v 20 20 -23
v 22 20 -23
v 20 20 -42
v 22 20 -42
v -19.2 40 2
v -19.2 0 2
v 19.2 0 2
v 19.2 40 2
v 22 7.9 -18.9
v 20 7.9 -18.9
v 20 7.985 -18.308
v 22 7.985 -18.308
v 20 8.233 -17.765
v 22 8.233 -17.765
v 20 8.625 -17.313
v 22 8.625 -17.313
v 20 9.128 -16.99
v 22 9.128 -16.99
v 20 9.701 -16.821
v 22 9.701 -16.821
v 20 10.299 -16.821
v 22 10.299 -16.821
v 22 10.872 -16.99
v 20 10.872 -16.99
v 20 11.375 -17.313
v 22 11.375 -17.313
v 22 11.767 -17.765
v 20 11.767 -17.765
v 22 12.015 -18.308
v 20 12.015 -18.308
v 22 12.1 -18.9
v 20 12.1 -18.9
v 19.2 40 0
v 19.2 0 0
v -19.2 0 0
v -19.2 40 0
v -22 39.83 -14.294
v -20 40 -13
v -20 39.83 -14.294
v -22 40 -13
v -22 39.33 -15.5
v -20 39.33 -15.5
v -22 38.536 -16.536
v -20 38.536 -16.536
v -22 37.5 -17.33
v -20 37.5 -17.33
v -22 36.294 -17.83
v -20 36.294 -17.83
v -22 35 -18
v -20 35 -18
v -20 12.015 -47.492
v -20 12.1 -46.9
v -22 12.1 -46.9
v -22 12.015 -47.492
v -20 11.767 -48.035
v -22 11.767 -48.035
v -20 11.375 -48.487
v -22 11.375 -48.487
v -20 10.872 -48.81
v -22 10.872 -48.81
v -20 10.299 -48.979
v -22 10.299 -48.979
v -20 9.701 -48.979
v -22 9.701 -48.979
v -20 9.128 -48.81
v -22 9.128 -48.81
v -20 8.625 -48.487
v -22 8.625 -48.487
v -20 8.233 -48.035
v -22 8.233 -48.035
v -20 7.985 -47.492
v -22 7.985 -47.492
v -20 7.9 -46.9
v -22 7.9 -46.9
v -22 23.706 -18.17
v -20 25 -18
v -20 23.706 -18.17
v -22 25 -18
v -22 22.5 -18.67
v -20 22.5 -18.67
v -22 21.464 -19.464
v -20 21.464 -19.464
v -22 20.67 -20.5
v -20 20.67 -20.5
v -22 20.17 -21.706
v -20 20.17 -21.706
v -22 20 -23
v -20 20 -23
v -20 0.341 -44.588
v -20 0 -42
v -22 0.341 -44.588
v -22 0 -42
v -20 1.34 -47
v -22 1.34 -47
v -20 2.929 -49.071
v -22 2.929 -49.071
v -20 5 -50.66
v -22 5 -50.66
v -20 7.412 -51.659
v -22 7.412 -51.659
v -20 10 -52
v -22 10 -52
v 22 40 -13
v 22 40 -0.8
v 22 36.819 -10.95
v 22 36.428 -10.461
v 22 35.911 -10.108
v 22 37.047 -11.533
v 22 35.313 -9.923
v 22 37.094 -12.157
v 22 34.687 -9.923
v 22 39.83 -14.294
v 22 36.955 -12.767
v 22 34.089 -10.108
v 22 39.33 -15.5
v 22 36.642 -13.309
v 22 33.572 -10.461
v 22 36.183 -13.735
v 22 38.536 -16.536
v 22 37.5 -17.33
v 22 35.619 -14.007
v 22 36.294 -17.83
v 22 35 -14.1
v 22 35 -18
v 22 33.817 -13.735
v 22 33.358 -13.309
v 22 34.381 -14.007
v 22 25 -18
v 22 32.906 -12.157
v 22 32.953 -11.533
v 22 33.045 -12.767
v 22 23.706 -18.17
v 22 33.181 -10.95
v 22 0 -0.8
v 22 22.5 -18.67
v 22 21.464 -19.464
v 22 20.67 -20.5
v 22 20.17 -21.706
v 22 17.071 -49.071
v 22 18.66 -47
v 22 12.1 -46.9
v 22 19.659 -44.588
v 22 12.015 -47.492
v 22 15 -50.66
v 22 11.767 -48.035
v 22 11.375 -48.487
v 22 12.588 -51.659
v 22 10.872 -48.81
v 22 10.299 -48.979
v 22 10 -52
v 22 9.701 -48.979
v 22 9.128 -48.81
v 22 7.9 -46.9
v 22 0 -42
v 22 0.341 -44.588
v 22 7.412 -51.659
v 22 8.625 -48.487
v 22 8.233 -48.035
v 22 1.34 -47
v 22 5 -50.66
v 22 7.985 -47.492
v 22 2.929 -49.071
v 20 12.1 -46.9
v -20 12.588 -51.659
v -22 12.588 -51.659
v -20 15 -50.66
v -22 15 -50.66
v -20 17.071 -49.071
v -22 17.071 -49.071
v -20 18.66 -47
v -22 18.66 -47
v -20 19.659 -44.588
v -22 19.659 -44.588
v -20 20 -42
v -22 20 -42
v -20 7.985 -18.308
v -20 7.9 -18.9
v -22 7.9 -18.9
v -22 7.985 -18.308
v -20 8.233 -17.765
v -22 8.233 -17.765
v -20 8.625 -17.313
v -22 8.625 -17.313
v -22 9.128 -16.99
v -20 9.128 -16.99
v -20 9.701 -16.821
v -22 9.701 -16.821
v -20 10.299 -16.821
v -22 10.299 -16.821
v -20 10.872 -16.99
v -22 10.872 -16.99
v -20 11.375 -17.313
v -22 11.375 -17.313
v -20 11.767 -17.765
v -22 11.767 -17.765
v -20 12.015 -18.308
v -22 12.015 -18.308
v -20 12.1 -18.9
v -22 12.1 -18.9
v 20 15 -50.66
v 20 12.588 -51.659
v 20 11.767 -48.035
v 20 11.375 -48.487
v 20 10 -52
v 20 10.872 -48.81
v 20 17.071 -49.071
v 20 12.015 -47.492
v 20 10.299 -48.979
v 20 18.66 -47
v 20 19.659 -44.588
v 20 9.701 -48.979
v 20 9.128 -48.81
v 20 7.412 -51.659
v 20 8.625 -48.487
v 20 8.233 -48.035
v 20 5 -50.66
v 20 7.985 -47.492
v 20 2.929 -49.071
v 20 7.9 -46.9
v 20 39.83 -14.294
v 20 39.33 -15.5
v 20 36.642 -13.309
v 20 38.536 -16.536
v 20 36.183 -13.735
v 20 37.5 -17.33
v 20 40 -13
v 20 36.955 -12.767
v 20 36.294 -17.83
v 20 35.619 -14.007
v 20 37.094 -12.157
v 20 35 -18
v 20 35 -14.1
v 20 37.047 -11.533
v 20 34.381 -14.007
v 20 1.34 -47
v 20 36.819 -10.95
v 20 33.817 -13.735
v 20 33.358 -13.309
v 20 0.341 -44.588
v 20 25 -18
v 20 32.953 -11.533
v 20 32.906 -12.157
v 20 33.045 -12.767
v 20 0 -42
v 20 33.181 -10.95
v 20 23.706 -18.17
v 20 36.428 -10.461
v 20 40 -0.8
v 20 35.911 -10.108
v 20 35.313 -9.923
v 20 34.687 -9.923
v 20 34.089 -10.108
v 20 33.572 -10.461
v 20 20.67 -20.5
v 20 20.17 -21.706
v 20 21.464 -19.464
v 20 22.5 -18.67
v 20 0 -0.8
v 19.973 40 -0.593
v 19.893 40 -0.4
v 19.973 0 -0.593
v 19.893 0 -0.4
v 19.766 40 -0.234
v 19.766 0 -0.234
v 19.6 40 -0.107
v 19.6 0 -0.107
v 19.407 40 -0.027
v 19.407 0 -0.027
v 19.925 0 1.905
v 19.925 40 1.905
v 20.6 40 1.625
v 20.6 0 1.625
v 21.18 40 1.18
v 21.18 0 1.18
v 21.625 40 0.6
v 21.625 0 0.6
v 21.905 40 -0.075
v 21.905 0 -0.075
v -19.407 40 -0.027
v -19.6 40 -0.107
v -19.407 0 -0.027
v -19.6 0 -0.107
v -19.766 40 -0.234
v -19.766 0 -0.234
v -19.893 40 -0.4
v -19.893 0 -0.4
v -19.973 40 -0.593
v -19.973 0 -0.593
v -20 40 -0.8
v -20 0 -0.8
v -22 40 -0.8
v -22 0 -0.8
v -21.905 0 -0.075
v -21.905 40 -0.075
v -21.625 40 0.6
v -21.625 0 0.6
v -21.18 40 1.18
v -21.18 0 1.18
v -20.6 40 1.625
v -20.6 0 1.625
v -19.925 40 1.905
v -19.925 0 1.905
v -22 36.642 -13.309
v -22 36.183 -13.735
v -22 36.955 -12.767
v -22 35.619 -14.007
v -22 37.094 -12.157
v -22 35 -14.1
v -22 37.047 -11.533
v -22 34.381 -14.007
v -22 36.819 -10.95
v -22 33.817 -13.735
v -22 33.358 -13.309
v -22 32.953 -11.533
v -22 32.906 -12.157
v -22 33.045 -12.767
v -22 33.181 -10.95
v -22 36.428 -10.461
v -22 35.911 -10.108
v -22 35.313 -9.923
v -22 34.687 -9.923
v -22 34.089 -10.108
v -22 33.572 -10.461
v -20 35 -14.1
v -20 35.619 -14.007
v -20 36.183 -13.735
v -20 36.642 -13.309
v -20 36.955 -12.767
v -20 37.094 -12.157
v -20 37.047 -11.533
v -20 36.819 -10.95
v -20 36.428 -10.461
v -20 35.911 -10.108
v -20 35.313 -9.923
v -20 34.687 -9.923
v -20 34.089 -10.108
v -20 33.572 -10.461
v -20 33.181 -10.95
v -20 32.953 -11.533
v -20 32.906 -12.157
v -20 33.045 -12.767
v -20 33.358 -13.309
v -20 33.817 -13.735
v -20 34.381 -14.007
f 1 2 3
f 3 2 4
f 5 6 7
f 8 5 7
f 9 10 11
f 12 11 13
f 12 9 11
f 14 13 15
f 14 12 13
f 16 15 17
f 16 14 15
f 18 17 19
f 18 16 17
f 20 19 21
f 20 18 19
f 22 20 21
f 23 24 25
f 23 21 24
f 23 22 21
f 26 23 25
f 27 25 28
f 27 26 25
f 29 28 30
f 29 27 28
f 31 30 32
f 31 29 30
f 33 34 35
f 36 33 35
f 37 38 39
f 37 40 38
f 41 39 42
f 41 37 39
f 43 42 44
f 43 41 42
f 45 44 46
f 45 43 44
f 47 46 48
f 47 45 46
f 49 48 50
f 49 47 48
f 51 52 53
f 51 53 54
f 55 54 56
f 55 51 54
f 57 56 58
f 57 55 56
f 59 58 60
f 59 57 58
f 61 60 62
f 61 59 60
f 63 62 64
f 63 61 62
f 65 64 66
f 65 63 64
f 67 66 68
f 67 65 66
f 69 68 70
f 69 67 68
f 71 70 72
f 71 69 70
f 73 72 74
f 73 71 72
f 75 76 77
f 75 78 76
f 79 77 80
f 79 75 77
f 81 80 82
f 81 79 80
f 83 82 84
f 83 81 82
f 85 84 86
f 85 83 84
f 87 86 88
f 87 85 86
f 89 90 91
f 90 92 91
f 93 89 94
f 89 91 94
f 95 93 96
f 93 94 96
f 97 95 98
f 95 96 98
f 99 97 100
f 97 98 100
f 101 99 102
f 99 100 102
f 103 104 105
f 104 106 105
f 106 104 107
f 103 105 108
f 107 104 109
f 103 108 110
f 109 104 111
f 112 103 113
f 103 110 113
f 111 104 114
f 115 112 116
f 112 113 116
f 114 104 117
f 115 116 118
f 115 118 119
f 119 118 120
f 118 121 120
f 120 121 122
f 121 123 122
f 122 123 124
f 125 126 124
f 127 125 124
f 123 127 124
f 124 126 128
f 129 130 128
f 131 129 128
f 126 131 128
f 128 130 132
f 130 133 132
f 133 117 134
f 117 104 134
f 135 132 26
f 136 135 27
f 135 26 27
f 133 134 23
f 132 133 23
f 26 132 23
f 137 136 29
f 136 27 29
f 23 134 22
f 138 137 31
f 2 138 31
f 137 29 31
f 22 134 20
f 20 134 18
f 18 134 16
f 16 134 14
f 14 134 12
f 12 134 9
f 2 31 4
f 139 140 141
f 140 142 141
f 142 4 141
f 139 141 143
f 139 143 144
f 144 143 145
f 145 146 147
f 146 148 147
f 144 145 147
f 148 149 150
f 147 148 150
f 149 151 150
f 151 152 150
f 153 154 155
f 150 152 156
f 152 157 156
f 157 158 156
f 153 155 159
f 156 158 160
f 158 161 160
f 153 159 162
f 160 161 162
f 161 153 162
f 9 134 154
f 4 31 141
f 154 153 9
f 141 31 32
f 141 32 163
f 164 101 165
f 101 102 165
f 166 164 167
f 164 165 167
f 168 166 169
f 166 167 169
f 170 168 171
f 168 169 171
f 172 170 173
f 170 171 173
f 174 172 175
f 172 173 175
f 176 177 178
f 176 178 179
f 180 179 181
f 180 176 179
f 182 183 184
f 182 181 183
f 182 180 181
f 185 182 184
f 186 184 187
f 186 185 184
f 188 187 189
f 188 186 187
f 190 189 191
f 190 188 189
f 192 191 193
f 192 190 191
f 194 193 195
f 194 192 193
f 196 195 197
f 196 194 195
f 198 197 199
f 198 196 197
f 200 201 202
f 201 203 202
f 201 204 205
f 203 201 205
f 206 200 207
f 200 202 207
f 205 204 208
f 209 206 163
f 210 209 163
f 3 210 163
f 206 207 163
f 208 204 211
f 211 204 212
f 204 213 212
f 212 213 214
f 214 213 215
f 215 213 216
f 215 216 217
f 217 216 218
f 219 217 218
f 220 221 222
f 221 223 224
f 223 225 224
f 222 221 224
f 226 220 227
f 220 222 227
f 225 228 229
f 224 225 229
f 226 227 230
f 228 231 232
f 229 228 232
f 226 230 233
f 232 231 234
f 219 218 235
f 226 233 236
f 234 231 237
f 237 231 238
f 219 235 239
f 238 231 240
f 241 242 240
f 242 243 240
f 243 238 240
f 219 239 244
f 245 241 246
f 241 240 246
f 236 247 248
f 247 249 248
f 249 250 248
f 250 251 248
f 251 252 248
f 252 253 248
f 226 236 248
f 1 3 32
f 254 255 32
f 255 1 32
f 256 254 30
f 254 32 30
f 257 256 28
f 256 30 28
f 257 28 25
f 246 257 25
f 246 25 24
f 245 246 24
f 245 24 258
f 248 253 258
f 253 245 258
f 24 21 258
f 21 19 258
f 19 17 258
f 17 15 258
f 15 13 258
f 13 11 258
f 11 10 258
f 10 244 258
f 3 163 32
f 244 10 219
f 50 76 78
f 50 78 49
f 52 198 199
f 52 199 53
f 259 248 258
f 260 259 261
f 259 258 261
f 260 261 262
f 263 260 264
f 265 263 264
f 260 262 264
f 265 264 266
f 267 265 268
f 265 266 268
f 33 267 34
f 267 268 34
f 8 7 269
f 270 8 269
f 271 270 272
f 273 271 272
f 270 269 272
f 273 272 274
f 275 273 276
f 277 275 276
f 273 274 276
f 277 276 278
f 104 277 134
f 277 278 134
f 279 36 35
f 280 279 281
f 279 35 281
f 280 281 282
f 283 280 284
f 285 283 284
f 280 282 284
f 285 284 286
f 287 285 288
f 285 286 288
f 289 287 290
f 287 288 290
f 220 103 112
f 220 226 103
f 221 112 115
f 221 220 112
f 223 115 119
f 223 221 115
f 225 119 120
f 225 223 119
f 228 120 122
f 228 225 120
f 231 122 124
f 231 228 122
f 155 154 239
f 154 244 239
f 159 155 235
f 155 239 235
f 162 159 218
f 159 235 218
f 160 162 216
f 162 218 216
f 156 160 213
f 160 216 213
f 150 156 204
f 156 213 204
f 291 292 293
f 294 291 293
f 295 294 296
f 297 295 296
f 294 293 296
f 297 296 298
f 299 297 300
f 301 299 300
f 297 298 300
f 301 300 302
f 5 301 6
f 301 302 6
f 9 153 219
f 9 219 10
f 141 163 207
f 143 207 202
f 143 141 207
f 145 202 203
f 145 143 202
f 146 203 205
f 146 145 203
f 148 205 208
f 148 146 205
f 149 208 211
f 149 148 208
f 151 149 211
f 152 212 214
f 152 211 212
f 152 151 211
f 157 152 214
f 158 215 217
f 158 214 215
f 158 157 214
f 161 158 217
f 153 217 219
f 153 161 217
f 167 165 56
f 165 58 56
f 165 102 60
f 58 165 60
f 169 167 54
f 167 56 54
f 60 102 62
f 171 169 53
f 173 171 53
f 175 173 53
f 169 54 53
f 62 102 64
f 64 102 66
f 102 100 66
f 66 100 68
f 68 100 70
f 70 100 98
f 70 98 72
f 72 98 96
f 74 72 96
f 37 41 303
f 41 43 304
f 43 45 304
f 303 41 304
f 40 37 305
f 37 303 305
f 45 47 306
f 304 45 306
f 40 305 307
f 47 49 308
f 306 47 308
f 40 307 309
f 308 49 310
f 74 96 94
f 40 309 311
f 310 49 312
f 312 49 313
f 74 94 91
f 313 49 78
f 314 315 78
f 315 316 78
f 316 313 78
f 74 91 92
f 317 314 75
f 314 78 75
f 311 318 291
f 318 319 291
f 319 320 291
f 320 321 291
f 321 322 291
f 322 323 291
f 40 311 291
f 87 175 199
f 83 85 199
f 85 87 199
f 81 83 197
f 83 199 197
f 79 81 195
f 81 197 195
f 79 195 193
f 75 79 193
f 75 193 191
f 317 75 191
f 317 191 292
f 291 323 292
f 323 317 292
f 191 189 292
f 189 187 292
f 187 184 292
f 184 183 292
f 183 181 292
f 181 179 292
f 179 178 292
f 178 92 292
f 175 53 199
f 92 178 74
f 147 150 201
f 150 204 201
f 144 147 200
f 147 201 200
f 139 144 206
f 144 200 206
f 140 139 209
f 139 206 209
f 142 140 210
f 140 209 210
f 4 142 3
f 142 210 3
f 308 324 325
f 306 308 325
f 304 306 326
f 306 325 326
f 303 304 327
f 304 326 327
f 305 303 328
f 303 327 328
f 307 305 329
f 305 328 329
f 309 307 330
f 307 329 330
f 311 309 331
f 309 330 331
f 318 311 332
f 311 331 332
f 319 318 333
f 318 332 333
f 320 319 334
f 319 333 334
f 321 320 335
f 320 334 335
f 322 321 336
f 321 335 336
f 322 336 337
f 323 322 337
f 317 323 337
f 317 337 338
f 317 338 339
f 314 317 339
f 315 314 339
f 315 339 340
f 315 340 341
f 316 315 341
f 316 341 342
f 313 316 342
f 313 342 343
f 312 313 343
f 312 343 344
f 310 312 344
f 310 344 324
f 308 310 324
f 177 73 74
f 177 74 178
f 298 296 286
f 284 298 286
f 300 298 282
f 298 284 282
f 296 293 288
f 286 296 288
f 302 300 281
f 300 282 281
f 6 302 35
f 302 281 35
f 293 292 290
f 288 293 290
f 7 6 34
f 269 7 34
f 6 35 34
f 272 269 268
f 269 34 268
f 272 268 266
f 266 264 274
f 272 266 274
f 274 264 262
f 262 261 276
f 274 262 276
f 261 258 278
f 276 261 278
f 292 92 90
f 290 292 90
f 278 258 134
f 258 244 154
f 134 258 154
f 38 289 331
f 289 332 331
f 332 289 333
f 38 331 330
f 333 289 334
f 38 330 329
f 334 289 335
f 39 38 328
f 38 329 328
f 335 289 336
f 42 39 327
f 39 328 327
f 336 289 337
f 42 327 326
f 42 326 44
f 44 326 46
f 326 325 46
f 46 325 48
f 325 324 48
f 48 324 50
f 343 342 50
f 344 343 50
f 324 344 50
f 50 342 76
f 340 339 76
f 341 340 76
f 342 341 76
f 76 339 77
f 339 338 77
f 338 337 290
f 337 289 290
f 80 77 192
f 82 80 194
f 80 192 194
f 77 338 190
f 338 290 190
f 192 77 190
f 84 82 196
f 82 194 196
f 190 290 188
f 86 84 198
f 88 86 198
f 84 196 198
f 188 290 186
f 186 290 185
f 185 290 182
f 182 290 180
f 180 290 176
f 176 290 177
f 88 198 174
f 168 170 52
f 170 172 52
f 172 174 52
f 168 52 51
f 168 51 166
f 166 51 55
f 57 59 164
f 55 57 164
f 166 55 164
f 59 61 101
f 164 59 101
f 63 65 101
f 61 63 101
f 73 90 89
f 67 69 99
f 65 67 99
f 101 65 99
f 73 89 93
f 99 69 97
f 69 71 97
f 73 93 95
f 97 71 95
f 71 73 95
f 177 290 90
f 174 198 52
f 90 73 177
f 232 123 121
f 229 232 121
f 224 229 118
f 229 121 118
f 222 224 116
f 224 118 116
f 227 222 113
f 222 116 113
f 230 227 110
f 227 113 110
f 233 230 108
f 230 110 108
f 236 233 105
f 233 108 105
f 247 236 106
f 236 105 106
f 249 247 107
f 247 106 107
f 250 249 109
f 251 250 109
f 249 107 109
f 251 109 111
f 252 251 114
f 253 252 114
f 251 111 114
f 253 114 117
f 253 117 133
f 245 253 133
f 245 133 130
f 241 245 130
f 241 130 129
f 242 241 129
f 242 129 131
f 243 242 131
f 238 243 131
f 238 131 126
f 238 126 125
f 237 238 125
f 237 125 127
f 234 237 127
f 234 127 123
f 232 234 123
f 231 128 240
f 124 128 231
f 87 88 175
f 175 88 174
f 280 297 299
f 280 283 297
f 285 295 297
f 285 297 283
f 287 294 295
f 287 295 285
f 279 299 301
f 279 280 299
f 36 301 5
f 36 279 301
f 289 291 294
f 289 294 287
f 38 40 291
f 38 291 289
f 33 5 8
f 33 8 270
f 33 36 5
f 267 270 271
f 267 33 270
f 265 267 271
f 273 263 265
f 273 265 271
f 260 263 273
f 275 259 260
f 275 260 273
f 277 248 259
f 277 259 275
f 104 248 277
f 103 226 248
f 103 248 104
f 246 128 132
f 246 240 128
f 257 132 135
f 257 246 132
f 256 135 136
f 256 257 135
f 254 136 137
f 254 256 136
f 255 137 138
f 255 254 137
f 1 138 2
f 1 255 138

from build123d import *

# Parameters (mm, degrees)
BASE_FLANGE1_DEPTH = 40
SKETCH6_W          = 34
SKETCH6_H          = 20
CUT_EXTRUDE1_DEPTH = 79.993670633
FILLET1_R          = 10
FILLET2_R          = 5
SKETCH7_R          = 2.1
CUT_EXTRUDE2_DEPTH = 79.993670633


# Read off the part's stored shape, not the designer's step: Base-Flange1
with BuildPart() as part:
    # Base-Flange1 outline → Base-Flange1 (new body)
    with BuildSketch(Plane(origin=(0, 0, 0), x_dir=(1, 0, 0), z_dir=(0, 1, 0))):
        with BuildLine():
            Line((-20, 0.8), (-20, 52))
            Line((-20, 52), (-22, 52))
            Line((-22, 52), (-22, 0.8))
            ThreePointArc((-22, 0.8), (-21.179898987, -1.179898987), (-19.2, -2))
            Line((-19.2, -2), (19.2, -2))
            ThreePointArc((19.2, -2), (21.179898987, -1.179898987), (22, 0.8))
            Line((22, 0.8), (22, 52))
            Line((22, 52), (20, 52))
            Line((20, 52), (20, 0.8))
            ThreePointArc((20, 0.8), (19.765685425, 0.234314575), (19.2, 0))
            Line((19.2, 0), (-19.2, 0))
            ThreePointArc((-19.2, 0), (-19.765685425, 0.234314575), (-20, 0.8))
        make_face()
    extrude(amount=BASE_FLANGE1_DEPTH)

    # Sketch6 → Cut-Extrude1 (cut, through all)
    with BuildSketch(Plane(origin=(22, 0, 0), x_dir=(0, 0, -1), z_dir=(1, 0, 0))):
        with Locations((35, 30)):
            Rectangle(SKETCH6_W, SKETCH6_H)
    extrude(amount=-CUT_EXTRUDE1_DEPTH, mode=Mode.SUBTRACT)

    # Fillet1
    fillet1_edges = [part.edges().sort_by_distance(p)[0] for p in [
        (-21, 0, -52),
        (-21, 20, -52),
        (21, 0, -52),
        (21, 20, -52),
    ]]
    fillet(fillet1_edges, radius=FILLET1_R - 0.0001)  # a hair under: the kernel refuses the full size

    # Fillet2
    fillet2_edges = [part.edges().sort_by_distance(p)[0] for p in [
        (-21, 40, -18),
        (21, 40, -18),
        (-21, 20, -18),
        (21, 20, -18),
    ]]
    fillet(fillet2_edges, radius=FILLET2_R)

    # Sketch7 → Cut-Extrude2 (cut, through all)
    with BuildSketch(Plane(origin=(22, 0, 0), x_dir=(0, 0, -1), z_dir=(1, 0, 0))):
        with Locations((12, 35)):
            Circle(SKETCH7_R)
        with BuildLine():
            Line((18.9, 12.1), (46.9, 12.1))
            ThreePointArc((46.9, 12.1), (49, 10), (46.9, 7.9))
            Line((46.9, 7.9), (18.9, 7.9))
            ThreePointArc((18.9, 7.9), (16.8, 10), (18.9, 12.1))
        make_face()
    extrude(amount=-CUT_EXTRUDE2_DEPTH, mode=Mode.SUBTRACT)


solid = part.part
